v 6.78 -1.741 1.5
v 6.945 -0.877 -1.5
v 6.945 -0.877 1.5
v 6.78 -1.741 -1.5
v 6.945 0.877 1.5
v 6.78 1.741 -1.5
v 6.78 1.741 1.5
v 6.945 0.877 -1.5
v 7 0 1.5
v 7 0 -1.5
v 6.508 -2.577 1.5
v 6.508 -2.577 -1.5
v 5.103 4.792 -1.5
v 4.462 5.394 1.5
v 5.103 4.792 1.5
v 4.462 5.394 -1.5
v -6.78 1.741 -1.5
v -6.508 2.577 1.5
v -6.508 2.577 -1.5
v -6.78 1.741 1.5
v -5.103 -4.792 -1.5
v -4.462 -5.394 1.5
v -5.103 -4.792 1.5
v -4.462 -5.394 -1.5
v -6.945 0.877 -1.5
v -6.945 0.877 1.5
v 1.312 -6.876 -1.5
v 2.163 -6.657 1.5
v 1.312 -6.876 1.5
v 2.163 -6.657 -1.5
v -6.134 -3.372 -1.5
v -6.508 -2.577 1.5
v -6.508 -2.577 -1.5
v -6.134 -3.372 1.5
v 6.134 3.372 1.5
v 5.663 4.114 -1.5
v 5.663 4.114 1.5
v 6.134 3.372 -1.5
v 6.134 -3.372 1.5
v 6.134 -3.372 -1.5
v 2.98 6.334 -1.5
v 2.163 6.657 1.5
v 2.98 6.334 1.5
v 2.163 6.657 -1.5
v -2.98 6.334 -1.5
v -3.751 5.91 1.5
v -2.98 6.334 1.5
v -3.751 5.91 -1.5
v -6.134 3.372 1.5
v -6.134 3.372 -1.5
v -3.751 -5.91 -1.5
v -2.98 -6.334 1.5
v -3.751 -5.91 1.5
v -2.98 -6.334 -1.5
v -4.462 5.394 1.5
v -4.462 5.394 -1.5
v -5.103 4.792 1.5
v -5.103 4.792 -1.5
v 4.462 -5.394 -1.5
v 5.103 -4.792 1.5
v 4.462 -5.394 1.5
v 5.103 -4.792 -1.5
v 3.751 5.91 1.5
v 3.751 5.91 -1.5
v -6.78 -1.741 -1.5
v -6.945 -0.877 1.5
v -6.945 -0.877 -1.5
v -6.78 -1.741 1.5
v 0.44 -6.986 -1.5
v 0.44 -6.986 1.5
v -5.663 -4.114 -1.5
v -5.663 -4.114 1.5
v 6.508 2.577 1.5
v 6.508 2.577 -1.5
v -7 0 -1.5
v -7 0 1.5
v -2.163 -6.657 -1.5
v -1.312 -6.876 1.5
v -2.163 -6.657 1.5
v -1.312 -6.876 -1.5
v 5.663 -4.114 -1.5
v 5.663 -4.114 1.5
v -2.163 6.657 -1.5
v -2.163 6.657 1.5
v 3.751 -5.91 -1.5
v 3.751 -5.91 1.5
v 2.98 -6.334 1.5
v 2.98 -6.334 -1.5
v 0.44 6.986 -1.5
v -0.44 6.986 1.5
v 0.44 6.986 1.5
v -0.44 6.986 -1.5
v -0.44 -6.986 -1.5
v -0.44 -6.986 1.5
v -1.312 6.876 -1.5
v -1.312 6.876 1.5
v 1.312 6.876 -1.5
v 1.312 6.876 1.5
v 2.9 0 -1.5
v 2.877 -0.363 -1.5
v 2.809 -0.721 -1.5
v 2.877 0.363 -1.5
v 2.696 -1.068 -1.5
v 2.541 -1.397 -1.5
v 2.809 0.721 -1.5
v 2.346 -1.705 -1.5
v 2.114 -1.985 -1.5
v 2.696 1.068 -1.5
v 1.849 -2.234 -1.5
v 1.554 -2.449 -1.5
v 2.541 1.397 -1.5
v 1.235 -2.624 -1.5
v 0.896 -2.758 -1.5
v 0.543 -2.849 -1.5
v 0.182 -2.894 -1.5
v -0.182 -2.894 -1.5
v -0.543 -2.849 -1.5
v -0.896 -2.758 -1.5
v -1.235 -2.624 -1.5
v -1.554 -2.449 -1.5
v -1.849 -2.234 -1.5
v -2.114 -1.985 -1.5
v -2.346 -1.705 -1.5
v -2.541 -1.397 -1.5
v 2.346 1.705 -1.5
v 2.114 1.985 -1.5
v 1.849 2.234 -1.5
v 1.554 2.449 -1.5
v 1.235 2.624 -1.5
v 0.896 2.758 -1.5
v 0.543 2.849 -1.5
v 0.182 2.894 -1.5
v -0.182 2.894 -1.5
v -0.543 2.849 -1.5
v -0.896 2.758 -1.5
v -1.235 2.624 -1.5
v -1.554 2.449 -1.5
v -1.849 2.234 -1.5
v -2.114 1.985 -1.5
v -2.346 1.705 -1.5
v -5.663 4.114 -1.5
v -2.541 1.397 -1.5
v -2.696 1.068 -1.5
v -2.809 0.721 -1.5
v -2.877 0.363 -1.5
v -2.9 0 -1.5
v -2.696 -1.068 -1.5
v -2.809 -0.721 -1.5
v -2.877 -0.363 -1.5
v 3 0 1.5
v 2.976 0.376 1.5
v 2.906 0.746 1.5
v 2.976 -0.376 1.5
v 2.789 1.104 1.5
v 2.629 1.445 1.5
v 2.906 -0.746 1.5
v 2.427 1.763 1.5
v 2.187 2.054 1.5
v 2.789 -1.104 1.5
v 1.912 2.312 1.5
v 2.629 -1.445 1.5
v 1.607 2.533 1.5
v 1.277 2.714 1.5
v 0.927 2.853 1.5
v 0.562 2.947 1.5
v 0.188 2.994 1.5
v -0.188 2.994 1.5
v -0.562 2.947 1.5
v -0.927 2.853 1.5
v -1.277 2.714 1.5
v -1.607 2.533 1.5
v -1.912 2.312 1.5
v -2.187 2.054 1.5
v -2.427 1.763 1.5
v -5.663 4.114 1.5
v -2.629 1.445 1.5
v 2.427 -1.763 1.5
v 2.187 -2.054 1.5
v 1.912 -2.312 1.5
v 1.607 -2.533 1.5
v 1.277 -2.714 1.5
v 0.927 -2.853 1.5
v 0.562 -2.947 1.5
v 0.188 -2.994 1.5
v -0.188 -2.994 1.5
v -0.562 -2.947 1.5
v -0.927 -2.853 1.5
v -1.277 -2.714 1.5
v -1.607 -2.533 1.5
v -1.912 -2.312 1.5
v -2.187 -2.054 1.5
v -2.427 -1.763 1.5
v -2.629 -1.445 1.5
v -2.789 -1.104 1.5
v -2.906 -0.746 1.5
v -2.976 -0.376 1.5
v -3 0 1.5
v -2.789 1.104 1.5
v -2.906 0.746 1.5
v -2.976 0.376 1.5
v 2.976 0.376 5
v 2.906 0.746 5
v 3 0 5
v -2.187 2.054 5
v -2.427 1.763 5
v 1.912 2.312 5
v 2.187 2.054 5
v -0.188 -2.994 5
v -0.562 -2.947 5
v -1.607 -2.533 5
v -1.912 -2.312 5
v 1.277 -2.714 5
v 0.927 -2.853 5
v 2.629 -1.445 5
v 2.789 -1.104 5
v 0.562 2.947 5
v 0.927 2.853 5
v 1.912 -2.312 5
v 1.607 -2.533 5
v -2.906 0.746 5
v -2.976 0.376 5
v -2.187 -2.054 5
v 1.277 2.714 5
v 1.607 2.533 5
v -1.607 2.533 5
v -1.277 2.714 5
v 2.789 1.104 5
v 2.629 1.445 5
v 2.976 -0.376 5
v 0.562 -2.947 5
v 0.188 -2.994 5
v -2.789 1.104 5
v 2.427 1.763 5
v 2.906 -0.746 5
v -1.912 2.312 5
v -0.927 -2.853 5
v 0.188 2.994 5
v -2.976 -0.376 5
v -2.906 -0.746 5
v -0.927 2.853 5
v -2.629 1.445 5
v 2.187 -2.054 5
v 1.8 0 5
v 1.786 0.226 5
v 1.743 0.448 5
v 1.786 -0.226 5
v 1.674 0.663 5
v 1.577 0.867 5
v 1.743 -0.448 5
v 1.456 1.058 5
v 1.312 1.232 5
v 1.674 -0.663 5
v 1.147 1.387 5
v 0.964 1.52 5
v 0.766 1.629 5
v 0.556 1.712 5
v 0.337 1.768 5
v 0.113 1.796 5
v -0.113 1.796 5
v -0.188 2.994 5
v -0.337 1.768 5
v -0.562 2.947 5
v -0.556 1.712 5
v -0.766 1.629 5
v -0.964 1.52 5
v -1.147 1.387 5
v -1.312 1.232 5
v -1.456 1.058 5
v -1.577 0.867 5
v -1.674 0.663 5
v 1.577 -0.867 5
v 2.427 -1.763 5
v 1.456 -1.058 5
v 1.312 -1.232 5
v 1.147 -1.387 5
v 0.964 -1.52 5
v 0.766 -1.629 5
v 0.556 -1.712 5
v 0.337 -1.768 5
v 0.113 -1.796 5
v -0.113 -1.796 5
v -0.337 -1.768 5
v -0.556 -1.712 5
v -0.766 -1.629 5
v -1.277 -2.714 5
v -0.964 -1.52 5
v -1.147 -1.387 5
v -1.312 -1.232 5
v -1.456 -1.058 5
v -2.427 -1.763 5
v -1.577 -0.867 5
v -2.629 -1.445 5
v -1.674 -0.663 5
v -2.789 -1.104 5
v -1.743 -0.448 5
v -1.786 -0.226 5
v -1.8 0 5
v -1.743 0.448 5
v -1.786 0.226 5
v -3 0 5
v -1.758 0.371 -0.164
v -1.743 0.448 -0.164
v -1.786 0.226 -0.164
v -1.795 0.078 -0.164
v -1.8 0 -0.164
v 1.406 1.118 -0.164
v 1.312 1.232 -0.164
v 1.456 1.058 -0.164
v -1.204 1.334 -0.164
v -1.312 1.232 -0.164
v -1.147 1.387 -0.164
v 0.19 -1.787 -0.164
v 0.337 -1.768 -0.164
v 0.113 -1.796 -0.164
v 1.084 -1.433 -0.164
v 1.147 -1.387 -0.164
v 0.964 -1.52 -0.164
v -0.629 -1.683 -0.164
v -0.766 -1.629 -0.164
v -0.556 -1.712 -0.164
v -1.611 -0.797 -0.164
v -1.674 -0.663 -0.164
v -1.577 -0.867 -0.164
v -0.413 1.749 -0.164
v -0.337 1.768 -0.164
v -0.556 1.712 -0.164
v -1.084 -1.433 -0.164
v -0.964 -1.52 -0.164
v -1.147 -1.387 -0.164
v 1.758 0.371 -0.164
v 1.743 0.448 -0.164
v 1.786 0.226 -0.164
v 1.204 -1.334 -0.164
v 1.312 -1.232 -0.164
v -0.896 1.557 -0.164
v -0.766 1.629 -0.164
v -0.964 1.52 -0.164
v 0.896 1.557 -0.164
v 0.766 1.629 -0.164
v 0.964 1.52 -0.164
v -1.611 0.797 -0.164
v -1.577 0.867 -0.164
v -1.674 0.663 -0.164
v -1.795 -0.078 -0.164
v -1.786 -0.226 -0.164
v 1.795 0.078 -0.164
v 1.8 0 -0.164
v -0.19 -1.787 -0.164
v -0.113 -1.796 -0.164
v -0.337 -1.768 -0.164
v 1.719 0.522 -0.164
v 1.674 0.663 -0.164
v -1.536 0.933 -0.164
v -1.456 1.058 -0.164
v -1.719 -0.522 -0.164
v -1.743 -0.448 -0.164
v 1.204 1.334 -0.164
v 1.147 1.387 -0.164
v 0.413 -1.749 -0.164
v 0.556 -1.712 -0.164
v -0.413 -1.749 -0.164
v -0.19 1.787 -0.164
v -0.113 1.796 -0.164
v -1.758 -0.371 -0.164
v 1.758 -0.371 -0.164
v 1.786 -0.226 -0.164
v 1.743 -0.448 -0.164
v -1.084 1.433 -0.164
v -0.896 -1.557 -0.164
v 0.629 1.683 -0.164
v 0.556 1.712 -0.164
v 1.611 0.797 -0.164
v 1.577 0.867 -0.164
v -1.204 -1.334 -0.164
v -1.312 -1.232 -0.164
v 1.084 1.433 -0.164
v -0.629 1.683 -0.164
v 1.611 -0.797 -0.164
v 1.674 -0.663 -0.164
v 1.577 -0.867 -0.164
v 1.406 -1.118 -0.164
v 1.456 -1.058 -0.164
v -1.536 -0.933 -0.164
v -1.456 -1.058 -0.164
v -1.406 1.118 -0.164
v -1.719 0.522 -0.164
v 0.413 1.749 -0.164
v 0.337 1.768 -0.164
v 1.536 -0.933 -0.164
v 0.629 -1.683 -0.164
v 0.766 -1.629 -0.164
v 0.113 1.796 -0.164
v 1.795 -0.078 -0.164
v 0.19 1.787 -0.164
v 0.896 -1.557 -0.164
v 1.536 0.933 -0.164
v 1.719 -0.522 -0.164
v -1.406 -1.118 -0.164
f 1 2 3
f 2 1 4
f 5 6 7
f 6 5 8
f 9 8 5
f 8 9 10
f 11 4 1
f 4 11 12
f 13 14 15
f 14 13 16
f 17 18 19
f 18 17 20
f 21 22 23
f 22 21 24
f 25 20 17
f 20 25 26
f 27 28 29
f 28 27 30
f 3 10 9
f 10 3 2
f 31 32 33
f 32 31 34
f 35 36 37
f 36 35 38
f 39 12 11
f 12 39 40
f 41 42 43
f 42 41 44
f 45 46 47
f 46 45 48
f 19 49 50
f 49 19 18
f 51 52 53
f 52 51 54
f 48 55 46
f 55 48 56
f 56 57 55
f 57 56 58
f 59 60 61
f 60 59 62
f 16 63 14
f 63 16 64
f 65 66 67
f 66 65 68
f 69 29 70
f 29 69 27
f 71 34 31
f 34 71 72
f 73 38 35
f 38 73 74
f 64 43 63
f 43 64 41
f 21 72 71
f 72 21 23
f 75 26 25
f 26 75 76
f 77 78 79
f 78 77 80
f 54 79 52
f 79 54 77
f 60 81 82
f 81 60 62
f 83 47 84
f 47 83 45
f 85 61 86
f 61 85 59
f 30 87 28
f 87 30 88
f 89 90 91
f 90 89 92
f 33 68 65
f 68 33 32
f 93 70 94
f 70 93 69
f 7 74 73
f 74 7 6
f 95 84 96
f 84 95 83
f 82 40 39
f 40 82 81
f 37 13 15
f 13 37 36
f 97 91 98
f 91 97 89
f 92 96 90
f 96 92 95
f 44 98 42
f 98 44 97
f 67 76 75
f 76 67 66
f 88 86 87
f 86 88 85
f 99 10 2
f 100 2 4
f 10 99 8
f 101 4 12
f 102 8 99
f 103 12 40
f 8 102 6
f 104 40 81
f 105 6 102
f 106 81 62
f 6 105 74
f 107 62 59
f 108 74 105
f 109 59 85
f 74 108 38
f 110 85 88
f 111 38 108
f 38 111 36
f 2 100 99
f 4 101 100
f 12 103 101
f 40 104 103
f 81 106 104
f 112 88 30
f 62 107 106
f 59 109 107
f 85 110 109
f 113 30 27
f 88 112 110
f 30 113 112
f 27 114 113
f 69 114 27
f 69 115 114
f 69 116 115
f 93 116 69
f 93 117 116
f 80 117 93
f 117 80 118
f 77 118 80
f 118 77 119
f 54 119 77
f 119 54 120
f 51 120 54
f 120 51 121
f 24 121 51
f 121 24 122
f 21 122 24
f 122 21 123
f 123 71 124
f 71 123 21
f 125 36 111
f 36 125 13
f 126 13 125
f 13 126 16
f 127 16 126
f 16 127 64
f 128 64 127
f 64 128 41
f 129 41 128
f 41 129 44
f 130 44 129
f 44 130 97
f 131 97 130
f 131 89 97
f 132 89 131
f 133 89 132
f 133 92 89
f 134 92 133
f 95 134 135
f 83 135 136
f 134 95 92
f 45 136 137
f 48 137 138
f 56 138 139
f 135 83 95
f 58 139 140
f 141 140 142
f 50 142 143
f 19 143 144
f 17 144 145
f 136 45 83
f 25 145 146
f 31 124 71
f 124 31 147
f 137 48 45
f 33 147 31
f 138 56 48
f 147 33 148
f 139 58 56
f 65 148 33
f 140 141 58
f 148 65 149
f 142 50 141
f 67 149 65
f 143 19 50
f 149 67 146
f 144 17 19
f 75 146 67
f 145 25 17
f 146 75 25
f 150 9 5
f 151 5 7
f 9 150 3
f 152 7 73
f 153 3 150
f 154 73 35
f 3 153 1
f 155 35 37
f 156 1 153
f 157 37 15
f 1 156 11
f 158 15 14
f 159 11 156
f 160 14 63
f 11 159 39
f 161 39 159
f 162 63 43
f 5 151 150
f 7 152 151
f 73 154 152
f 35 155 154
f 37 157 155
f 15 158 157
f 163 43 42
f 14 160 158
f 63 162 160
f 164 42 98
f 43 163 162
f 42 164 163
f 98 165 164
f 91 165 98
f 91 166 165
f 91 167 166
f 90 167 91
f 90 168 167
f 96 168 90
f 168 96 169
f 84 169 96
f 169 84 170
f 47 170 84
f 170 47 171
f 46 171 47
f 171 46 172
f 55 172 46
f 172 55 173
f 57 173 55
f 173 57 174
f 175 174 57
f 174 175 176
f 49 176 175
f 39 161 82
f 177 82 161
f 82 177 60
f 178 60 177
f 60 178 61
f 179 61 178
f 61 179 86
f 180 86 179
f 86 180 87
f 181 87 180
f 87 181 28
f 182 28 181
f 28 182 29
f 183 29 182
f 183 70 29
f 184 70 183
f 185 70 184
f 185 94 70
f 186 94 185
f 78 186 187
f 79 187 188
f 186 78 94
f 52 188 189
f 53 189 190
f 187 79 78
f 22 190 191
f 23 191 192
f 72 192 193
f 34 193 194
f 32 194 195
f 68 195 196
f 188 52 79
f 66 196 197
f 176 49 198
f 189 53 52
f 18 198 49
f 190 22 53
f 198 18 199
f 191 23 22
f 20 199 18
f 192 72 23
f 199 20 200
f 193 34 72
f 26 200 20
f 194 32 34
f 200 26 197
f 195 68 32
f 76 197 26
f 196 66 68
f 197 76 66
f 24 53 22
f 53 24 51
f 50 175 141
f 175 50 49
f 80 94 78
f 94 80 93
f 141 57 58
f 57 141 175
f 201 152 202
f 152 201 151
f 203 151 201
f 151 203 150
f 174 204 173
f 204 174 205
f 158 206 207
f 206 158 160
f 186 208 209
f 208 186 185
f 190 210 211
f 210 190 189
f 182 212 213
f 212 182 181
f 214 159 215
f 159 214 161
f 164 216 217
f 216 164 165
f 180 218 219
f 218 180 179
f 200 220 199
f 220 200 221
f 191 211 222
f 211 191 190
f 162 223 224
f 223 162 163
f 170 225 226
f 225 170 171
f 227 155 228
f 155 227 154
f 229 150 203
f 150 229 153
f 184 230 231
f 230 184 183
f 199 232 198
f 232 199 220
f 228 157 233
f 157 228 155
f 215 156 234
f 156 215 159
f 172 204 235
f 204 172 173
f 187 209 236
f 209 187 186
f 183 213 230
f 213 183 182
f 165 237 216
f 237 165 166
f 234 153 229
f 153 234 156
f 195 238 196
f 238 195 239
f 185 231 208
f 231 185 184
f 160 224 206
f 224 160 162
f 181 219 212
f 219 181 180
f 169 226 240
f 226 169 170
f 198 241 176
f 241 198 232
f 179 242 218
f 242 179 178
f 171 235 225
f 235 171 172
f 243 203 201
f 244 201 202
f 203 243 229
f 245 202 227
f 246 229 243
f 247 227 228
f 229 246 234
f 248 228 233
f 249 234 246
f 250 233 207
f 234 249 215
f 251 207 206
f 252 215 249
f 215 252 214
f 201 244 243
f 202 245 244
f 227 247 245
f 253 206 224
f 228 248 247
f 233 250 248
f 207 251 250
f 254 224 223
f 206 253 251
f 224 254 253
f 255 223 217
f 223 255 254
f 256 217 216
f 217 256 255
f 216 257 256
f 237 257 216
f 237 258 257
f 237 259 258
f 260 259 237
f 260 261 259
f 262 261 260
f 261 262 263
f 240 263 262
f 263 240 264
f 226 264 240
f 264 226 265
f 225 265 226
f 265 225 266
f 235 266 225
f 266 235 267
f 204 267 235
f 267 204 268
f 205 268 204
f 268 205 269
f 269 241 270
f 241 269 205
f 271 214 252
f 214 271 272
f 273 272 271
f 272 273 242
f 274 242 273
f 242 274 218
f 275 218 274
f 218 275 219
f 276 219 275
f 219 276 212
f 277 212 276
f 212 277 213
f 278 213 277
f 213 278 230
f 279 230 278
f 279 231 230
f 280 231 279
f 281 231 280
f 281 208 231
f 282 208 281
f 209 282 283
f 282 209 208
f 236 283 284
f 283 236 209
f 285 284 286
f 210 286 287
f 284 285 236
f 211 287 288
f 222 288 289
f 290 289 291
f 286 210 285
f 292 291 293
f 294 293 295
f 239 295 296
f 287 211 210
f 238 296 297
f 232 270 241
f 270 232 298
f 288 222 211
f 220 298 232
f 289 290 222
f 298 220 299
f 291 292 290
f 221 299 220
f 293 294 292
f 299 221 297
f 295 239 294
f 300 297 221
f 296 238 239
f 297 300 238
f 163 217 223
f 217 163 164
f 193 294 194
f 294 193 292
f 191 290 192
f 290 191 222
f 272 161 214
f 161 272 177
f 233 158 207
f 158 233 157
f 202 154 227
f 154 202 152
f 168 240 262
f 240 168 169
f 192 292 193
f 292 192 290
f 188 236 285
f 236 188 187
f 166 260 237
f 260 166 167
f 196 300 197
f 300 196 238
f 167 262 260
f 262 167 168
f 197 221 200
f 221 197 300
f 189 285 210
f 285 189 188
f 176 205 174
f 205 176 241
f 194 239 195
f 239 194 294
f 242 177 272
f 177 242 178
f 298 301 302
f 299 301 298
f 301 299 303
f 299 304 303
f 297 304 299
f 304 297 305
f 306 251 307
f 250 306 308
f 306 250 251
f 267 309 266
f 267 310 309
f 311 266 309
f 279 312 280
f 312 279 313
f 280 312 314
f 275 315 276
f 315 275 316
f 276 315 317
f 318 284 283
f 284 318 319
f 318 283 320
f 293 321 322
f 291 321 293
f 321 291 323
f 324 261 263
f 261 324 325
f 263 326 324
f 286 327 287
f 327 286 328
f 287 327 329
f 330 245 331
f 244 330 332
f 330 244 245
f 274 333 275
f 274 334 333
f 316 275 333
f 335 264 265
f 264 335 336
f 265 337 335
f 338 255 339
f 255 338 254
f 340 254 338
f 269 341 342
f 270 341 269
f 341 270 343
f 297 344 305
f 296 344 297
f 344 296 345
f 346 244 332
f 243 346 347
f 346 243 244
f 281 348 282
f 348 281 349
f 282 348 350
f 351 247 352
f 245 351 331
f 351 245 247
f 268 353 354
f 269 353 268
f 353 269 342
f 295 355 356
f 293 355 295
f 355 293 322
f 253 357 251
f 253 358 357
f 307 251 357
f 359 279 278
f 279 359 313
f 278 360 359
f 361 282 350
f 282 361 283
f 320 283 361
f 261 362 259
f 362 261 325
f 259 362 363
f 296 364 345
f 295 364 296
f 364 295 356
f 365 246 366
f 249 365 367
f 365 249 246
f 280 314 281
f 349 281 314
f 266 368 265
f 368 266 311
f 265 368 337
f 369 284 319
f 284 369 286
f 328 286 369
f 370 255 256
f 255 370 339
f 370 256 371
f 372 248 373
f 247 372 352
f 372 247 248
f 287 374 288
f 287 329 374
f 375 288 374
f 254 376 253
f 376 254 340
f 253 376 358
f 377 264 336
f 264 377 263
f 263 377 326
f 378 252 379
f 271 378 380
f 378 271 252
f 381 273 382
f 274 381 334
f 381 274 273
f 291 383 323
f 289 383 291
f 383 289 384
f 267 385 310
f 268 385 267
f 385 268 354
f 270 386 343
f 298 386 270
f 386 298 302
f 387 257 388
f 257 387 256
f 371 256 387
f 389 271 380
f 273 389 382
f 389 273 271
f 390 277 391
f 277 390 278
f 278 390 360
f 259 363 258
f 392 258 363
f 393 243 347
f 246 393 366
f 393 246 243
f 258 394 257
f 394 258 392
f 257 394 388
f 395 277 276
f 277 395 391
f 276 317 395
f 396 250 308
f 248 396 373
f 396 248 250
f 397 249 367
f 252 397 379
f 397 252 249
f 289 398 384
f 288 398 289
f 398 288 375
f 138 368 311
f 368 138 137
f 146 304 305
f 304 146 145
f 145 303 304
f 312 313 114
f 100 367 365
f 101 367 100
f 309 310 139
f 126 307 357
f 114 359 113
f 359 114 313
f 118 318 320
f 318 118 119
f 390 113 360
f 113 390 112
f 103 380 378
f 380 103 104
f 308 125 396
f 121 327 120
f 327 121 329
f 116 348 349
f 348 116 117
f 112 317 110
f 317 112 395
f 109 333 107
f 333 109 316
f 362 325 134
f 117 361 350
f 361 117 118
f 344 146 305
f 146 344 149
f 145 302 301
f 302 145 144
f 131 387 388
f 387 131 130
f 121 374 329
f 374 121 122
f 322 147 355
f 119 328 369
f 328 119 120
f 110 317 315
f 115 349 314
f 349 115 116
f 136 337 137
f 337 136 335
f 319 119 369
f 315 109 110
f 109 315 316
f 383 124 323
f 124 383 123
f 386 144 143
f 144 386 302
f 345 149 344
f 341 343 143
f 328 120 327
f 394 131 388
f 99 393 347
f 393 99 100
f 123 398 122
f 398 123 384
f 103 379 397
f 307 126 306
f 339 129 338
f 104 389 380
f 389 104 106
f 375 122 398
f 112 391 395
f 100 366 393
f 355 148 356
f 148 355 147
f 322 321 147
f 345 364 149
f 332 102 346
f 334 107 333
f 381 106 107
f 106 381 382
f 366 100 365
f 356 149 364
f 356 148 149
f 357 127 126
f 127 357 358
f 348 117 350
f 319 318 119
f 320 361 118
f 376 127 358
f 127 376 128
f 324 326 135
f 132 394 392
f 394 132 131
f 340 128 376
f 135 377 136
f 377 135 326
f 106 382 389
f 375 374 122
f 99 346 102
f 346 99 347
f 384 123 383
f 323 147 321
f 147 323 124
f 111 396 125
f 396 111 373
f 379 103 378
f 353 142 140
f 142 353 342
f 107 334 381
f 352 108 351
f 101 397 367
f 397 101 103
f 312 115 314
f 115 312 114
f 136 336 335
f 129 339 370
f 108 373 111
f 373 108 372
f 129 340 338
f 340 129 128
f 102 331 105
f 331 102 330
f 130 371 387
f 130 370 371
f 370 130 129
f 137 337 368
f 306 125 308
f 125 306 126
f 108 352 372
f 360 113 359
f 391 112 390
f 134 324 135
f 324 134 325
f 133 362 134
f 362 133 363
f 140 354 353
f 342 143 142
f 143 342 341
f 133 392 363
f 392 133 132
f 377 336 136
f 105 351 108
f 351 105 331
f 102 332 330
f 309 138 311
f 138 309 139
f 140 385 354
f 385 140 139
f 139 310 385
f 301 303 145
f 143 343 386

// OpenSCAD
$fn = 50;


difference() {
	union() {
		translate(v = [0, 0, -1.5000000000]) {
			cylinder(h = 3, r = 7.0000000000);
		}
		translate(v = [0, 0, -1.5000000000]) {
			cylinder(h = 6.5000000000, r = 3.0000000000);
		}
	}
	union() {
		translate(v = [0, 0, -1.5000000000]) {
			rotate(a = [0, 180, 0]) {
				difference() {
					union() {
						translate(v = [0, 0, -6.5000000000]) {
							cylinder(h = 6.5000000000, r = 1.5000000000);
						}
						translate(v = [0, 0, -6.5000000000]) {
							cylinder(h = 6.5000000000, r = 1.8000000000);
						}
						translate(v = [0, 0, -1.7000000000]) {
							cylinder(h = 1.7000000000, r1 = 1.5000000000, r2 = 2.9000000000);
						}
						translate(v = [0, 0, -6.5000000000]) {
							cylinder(h = 6.5000000000, r = 1.5000000000);
						}
					}
					union();
				}
			}
		}
		translate(v = [0, 0, -100.0000000000]) {
			cylinder(h = 200, r = 1.5000000000);
		}
	}
}
